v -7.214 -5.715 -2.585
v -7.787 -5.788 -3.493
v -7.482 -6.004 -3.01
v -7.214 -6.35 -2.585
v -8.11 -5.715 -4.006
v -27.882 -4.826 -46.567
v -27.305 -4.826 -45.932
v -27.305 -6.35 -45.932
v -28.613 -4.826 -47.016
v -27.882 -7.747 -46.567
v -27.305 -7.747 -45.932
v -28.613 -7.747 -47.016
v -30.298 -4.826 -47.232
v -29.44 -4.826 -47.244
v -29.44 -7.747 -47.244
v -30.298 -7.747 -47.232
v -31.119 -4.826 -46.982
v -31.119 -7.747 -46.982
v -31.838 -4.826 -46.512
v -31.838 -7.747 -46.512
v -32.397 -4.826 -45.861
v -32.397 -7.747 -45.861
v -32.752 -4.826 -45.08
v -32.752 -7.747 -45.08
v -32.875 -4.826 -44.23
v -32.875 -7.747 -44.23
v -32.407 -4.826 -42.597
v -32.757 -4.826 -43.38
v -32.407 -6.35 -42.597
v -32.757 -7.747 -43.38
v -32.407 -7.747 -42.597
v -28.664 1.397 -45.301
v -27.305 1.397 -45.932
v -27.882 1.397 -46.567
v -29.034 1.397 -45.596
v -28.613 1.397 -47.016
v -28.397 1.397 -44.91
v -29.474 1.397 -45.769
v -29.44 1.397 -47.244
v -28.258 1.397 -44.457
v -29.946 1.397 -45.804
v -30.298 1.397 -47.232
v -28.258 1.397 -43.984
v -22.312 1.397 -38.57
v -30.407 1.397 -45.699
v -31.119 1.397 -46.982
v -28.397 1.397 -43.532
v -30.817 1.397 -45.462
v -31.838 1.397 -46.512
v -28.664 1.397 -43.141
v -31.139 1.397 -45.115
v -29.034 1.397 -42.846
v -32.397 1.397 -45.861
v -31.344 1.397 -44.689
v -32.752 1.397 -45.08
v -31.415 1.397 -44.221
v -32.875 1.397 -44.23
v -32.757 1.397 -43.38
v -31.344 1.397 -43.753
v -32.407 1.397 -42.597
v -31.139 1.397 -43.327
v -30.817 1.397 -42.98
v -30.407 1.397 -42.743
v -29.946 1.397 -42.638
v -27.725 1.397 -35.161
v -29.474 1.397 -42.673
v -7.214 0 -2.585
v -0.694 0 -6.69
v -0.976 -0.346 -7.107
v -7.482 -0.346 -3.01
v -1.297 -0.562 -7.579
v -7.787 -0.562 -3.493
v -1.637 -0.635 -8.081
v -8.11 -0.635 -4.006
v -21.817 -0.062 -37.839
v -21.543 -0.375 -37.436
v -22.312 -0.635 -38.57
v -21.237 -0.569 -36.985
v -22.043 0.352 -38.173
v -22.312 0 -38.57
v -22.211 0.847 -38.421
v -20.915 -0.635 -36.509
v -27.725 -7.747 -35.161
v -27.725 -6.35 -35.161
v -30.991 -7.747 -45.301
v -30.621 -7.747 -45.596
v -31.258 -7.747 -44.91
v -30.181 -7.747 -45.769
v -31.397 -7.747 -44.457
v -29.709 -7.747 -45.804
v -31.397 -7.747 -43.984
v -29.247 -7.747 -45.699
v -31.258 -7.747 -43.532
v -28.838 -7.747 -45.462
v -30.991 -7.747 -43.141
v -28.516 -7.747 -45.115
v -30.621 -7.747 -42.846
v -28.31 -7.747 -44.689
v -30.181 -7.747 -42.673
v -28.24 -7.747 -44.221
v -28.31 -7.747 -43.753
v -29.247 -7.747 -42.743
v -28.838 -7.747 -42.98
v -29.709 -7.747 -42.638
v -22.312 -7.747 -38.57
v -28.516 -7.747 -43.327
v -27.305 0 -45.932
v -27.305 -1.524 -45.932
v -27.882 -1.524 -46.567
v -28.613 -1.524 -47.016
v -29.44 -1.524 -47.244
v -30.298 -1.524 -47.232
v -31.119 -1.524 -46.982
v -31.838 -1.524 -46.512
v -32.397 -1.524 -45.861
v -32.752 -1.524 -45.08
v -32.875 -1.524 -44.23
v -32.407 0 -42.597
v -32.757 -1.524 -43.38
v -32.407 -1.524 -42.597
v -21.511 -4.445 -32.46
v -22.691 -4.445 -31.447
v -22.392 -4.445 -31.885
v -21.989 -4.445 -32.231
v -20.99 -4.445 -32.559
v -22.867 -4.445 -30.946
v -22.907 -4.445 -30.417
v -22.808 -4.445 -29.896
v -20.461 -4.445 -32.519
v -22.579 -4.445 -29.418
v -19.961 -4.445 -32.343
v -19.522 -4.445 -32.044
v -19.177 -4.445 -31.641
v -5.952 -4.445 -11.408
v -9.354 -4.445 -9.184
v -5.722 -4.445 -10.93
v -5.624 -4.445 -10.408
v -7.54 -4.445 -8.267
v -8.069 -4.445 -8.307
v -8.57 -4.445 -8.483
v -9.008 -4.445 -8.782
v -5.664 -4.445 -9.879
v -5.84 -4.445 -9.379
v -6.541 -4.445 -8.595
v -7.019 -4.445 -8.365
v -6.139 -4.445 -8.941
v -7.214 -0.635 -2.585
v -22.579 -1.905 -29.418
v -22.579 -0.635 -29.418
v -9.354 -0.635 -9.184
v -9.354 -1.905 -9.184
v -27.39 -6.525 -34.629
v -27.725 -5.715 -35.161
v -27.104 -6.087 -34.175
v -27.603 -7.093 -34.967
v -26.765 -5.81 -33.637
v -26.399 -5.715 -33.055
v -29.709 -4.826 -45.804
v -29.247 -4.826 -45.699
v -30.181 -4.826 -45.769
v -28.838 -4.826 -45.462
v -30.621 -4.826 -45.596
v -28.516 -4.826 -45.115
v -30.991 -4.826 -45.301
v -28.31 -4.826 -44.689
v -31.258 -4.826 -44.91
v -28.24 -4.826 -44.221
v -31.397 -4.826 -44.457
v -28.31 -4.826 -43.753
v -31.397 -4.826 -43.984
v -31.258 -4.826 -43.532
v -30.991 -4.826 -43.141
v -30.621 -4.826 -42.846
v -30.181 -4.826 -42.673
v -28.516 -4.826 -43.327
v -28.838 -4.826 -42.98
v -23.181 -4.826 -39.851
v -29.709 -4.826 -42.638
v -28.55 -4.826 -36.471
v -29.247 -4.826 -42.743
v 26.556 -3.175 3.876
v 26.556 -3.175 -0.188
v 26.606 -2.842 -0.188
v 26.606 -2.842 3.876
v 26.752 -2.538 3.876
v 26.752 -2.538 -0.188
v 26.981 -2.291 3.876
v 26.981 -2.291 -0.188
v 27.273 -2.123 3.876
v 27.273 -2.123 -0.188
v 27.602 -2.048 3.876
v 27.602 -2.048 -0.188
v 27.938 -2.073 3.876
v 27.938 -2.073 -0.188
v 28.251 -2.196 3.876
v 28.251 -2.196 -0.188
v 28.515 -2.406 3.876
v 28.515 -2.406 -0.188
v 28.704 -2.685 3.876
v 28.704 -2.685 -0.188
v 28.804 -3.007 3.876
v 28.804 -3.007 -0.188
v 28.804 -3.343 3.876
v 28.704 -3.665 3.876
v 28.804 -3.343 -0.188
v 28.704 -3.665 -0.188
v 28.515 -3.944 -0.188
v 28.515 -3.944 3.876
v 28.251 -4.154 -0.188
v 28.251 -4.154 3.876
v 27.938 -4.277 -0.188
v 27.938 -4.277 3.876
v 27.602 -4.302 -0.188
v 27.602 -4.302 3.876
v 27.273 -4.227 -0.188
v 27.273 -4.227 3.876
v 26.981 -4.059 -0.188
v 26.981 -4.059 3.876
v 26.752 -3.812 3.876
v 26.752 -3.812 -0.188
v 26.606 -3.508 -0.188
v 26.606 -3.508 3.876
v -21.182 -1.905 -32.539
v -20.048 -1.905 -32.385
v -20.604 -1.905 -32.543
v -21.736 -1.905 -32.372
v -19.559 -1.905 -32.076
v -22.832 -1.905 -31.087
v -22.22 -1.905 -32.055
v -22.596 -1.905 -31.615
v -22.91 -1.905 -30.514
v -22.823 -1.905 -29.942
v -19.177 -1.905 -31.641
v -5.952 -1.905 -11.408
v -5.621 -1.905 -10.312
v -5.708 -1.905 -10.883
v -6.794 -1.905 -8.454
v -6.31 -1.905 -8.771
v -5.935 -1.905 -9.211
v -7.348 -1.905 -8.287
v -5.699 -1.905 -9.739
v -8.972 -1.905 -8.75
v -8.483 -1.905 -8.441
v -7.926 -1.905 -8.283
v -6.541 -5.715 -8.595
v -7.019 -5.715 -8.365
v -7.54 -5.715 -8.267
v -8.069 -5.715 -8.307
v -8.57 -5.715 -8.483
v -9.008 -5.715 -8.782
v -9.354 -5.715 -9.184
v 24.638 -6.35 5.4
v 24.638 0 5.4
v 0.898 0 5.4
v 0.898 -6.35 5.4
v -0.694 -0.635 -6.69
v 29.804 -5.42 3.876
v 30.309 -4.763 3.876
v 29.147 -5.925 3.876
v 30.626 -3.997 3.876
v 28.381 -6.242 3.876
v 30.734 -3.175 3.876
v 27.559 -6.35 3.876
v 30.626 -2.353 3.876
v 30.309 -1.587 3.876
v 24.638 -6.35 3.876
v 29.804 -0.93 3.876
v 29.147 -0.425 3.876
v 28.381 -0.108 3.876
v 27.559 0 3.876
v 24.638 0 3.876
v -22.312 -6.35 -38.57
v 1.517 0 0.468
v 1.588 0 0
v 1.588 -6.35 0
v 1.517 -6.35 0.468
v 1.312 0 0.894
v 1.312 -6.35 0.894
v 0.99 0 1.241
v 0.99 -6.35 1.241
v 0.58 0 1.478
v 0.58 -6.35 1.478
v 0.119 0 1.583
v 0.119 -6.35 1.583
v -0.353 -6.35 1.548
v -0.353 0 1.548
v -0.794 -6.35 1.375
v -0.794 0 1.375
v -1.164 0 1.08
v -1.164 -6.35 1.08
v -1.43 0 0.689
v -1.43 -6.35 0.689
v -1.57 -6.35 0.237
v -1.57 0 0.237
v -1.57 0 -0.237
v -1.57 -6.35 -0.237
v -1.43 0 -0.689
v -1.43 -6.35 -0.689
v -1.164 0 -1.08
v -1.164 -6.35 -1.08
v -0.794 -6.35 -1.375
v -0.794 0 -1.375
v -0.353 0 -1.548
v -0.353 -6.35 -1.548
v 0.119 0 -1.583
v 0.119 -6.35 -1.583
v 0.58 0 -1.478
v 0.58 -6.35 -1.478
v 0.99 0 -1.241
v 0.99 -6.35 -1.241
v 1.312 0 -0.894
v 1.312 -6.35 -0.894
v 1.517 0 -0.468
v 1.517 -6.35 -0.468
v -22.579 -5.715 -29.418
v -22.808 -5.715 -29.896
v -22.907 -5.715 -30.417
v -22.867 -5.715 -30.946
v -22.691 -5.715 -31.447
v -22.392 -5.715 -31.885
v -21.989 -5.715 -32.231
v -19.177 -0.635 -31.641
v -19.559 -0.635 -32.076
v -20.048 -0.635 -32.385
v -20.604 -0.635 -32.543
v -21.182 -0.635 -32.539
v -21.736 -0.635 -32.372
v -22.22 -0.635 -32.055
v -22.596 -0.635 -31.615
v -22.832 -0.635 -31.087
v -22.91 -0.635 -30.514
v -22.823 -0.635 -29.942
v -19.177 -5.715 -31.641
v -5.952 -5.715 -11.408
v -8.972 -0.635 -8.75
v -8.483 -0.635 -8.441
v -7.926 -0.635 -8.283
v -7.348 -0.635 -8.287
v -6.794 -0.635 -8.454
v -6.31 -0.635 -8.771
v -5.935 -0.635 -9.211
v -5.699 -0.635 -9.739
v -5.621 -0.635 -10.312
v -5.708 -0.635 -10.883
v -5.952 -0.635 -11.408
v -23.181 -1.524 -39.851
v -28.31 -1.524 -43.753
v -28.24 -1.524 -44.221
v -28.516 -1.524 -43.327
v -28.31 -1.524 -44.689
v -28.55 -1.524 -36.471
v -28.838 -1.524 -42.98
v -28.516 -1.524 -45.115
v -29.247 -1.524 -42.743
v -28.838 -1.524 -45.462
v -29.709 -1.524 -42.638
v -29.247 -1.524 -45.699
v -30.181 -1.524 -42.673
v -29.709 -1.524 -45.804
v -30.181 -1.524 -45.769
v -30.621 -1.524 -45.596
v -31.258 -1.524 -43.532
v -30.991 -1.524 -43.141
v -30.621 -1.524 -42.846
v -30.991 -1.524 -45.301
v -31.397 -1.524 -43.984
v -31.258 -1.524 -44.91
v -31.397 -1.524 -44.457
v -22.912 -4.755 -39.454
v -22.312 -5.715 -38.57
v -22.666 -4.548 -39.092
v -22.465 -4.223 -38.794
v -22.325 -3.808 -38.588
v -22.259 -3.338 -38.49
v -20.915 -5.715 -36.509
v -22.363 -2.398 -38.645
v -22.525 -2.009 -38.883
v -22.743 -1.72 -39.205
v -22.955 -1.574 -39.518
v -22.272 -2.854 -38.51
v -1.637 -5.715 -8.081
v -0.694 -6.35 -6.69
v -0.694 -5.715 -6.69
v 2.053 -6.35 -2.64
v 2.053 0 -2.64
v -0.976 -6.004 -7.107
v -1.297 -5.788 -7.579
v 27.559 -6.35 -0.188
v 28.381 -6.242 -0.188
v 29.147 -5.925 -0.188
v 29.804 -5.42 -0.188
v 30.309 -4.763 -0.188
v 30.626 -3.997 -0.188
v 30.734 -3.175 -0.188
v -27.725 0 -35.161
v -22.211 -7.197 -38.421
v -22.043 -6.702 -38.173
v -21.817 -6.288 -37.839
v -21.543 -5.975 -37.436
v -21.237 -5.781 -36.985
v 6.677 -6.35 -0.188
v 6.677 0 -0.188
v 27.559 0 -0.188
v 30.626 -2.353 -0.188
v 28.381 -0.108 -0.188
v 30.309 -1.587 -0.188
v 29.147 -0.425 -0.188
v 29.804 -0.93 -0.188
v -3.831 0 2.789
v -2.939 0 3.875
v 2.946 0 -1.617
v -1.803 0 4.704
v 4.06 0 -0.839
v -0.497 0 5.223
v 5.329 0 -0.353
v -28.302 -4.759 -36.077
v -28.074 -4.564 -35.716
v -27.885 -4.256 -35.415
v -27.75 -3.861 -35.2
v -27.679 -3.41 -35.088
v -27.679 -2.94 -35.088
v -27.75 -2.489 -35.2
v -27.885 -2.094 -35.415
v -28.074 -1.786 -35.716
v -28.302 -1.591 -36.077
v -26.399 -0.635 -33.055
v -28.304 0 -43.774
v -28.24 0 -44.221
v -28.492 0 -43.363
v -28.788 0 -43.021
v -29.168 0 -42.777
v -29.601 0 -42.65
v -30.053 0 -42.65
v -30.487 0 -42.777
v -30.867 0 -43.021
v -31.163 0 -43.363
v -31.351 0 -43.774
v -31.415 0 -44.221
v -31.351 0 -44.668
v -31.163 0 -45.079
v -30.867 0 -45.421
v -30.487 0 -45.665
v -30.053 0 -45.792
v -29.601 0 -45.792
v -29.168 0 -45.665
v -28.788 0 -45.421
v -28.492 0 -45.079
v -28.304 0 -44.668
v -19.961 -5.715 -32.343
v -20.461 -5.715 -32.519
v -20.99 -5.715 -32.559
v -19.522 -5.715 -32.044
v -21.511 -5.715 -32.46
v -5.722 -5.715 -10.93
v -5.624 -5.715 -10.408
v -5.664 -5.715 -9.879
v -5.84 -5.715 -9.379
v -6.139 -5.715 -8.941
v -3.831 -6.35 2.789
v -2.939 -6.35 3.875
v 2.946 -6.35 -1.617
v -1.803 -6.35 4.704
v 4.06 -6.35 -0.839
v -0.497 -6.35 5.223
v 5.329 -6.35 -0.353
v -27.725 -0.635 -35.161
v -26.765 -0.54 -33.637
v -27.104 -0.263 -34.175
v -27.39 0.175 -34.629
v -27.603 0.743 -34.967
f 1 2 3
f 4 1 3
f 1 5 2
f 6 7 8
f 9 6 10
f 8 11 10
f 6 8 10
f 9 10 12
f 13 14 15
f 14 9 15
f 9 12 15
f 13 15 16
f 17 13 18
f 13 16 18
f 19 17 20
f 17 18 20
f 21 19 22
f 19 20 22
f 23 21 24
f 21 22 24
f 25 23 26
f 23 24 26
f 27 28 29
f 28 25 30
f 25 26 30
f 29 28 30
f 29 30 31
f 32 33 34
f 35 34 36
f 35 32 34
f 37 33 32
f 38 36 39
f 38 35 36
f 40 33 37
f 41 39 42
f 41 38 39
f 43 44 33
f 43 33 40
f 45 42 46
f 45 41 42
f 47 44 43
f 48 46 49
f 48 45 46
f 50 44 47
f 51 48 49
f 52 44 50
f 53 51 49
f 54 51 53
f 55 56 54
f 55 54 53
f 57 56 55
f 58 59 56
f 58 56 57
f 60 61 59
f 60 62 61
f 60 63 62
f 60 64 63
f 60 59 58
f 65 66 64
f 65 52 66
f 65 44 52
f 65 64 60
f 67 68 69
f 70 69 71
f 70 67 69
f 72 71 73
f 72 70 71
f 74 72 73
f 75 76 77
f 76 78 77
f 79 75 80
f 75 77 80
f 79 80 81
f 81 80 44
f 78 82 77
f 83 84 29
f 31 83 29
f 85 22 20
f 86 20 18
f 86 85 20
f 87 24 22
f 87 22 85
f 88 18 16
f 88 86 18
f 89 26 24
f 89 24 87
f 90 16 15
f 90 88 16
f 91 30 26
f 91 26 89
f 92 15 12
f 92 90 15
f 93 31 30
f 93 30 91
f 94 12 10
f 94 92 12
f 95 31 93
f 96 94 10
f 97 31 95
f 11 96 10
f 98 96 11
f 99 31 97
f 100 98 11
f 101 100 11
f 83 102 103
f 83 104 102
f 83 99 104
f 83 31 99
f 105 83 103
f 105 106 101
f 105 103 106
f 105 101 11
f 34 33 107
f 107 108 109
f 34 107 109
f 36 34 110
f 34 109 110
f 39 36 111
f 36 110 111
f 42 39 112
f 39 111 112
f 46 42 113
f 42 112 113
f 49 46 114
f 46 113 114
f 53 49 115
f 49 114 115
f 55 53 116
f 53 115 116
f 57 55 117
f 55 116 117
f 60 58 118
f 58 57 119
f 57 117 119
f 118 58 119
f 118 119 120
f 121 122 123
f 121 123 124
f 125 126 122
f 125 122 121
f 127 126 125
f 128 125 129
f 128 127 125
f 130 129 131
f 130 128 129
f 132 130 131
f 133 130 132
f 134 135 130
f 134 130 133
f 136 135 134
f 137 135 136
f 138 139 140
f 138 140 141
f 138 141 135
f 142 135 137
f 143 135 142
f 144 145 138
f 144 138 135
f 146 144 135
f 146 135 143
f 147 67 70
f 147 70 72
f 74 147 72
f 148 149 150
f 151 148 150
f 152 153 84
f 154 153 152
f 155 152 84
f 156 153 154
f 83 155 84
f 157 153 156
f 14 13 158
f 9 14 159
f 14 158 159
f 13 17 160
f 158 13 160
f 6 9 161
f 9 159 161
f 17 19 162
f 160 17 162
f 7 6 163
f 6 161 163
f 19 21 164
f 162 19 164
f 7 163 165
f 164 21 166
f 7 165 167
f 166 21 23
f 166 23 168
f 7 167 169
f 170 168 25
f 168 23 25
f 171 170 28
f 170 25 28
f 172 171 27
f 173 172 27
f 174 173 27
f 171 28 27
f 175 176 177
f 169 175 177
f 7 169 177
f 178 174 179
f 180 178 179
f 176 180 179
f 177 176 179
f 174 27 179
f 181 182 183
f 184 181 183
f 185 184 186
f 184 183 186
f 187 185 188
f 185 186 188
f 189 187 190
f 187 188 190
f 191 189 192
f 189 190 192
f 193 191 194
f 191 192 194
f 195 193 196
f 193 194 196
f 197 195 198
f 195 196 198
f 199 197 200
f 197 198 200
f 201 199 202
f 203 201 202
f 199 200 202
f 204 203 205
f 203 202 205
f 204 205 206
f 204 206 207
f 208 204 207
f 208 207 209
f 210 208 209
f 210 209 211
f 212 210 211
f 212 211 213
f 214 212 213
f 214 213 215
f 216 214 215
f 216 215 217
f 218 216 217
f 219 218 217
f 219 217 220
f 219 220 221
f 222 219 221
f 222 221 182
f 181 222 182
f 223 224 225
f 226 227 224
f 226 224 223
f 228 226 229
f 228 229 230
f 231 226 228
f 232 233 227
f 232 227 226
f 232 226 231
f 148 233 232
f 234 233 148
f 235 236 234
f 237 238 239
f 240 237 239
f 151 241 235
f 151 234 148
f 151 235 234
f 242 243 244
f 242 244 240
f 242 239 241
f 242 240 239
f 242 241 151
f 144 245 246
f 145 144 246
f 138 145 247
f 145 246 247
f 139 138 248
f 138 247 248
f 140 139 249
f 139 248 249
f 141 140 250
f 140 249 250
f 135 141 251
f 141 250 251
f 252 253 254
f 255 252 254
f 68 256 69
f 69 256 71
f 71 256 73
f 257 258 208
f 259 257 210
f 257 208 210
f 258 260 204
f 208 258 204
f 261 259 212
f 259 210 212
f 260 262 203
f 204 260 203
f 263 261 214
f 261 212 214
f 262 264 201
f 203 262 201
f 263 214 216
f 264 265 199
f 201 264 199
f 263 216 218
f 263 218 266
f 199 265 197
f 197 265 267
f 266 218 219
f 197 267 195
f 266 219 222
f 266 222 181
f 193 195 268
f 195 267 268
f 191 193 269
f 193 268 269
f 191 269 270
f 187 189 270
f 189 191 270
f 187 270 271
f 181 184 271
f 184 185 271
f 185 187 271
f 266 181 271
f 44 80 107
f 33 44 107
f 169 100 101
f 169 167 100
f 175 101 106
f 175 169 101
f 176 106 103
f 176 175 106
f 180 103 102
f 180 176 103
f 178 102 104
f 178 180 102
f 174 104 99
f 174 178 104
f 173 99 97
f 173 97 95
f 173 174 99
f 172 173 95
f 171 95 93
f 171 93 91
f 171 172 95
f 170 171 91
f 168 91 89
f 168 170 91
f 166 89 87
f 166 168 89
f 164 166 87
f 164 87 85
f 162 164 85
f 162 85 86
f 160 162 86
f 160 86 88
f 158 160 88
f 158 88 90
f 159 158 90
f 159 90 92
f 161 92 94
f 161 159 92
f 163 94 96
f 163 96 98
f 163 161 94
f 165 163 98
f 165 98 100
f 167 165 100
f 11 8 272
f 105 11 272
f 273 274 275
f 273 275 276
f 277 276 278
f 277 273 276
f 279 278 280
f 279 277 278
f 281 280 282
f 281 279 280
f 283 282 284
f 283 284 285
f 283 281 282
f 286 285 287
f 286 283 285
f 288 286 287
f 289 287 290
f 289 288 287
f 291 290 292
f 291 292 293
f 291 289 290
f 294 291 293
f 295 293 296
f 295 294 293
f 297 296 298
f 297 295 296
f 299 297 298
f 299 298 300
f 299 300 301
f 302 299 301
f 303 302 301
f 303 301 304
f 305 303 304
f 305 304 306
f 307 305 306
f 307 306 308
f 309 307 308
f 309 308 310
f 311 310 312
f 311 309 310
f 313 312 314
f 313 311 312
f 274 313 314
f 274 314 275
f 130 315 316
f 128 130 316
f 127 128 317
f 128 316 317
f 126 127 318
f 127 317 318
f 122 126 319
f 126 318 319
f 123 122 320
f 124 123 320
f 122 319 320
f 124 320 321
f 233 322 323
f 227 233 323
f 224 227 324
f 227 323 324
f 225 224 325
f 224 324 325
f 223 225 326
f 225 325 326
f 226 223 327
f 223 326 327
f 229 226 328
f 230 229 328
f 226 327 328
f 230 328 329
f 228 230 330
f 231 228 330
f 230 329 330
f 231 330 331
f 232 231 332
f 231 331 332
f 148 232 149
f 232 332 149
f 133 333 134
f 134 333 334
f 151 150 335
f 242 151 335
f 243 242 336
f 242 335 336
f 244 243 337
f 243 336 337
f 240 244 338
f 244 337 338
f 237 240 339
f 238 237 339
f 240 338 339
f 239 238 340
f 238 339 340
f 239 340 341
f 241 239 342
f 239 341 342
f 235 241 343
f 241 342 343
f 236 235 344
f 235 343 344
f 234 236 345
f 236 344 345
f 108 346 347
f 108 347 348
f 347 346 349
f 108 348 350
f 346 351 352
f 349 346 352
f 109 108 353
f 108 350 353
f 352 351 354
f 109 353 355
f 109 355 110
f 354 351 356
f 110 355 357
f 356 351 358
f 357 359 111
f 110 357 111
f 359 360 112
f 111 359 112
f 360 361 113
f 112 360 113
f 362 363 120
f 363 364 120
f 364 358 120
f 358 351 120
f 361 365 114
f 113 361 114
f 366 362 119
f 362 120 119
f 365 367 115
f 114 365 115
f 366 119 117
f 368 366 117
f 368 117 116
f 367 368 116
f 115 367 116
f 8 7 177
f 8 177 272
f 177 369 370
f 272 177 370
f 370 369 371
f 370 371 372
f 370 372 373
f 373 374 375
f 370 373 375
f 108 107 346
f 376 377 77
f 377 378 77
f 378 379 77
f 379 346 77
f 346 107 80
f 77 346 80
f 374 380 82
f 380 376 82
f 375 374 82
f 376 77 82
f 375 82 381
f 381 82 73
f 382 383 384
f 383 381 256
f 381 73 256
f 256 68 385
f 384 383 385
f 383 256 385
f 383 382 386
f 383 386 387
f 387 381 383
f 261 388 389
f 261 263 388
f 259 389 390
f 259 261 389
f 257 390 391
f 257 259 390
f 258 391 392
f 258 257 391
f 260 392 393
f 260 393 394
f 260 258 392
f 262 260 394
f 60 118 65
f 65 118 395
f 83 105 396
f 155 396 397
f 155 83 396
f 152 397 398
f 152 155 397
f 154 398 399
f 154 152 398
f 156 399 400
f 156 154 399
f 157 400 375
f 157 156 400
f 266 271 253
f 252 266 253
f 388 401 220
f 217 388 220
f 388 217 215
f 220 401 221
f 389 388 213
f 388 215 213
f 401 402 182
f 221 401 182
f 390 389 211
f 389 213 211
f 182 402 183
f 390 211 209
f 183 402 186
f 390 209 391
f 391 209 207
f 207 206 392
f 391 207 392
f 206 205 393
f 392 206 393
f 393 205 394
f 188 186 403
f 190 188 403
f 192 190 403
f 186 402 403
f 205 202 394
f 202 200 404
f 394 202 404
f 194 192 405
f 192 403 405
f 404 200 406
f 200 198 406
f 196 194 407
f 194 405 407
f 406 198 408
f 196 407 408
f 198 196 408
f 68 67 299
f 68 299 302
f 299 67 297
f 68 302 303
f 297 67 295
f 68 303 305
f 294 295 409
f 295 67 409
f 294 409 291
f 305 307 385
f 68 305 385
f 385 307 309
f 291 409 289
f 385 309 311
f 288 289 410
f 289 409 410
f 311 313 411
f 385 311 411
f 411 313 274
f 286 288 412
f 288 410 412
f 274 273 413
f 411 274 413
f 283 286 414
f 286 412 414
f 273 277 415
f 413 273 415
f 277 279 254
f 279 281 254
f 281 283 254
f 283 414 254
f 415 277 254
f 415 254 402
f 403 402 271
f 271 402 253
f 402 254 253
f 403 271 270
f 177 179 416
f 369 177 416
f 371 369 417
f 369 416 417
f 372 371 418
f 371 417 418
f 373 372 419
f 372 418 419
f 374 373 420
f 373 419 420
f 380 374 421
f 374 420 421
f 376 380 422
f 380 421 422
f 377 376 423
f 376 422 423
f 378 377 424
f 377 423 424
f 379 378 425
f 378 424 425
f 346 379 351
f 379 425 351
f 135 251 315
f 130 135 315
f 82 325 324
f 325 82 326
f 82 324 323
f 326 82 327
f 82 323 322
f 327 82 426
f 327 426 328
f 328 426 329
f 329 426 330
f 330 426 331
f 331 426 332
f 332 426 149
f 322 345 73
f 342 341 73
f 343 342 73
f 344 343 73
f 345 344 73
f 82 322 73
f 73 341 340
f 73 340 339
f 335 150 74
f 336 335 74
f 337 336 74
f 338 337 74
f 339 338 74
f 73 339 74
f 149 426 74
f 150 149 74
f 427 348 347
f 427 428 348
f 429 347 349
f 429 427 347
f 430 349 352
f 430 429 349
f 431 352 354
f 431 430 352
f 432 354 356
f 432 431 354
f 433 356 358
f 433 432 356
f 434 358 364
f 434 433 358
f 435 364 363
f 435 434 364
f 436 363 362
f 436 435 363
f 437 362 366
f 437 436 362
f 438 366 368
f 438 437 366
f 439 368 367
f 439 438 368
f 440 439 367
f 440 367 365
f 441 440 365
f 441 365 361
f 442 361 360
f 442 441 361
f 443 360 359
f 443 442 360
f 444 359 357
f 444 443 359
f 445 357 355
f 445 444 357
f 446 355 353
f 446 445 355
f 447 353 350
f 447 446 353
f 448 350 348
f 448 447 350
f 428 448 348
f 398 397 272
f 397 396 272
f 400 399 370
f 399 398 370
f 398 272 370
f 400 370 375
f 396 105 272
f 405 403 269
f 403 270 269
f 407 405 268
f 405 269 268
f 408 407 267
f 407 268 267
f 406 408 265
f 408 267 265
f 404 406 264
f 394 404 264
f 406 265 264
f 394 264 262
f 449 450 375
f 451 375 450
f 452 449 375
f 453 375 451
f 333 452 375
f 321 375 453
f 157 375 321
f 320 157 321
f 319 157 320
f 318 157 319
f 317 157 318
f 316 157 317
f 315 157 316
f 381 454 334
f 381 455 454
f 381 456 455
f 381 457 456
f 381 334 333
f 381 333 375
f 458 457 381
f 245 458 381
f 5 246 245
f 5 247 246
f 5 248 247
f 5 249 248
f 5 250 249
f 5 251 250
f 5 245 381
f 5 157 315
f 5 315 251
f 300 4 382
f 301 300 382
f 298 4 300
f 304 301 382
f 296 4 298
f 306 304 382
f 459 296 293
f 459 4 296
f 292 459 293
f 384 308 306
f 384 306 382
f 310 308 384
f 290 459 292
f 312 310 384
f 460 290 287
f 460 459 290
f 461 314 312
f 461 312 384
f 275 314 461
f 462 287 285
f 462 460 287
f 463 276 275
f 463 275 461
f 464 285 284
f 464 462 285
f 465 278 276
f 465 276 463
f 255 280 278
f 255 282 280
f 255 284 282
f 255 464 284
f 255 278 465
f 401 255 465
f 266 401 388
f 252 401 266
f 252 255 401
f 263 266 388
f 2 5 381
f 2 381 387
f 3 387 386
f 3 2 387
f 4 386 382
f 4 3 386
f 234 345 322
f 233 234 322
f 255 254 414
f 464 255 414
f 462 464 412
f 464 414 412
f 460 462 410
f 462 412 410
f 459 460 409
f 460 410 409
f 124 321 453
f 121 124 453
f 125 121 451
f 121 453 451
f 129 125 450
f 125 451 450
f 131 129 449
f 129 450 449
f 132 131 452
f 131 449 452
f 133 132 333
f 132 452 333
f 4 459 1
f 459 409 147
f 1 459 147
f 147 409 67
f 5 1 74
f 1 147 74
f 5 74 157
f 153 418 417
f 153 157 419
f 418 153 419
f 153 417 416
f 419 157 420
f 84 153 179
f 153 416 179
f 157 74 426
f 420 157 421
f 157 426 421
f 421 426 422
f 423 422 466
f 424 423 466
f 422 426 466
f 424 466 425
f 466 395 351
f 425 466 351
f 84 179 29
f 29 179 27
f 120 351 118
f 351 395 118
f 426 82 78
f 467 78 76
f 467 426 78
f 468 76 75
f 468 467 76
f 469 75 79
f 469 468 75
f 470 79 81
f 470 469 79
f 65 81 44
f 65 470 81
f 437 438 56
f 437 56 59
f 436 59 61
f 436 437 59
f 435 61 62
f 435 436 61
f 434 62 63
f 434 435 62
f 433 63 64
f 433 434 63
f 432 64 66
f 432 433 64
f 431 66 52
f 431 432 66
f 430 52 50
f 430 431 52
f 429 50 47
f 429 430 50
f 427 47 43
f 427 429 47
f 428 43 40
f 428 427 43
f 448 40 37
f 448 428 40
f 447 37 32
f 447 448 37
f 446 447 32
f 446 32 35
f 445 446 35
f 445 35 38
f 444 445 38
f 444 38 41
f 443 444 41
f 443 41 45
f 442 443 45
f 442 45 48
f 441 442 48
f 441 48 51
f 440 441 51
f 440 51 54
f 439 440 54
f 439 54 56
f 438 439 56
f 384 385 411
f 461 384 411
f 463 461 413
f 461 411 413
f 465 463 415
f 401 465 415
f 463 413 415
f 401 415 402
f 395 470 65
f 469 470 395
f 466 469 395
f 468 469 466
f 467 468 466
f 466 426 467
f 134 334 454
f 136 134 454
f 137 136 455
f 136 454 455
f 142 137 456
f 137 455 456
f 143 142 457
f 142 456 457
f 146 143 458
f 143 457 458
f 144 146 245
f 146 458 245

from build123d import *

# Parameters (mm, degrees)
F0_R          = 1.5875
F1_DEPTH      = 6.35
F3_D          = 2.2606
F4_R          = 3.17499
F5_R          = 1.5875
F6_DEPTH      = 1.397
F7_R          = 1.5875
F8_DEPTH      = 1.397
F10_DEPTH     = 55.922402023
F11_W         = 0.635
F11_H         = 38.4961159321
F12_DEPTH     = 55.922402023
F13_T4_DEPTH  = 12.6181992369
F13_T9_DEPTH  = 12.6181992369
F13_T14_DEPTH = 11.9054737587
F13_T19_DEPTH = 11.9054737587
F15_DEPTH     = 1.27
F17_DEPTH     = 1.27


# Not quite as in the source:
# - a fillet or chamfer that OpenCascade refuses, or shapes differently, is made with other operations: its cross-section is extruded or revolved along the edge and cut away or added
# - a fillet or chamfer is up to 0.001 mm smaller than in the source, because OpenCascade refuses the exact size


with BuildPart() as f1:
    # F0 (on Front) → F1 (new body)
    with BuildSketch(Plane.XZ):
        with BuildLine():
            Line((6.6774413169, -0.1881909028), (30.734, -0.1881909028))
            Line((30.734, -0.1881909028), (30.734, 3.8758090972))
            Line((30.734, 3.8758090972), (24.638, 3.8758090972))
            Line((24.638, 3.8758090972), (24.638, 5.3998090972))
            Line((24.638, 5.3998090972), (0.8976435847, 5.3998090972))
            ThreePointArc((0.8976435847, 5.3998090972), (-1.8031521678, 4.7037868469), (-3.8311440773, 2.7891084184))
            Line((-3.8311440773, 2.7891084184), (-32.4066881959, -42.5968826722))
            ThreePointArc((-32.4066881959, -42.5968826722), (-31.4949255527, -46.7722351265), (-27.3046829217, -45.931553303))
            Line((-27.3046829217, -45.931553303), (2.052552643, -2.6399274008))
            ThreePointArc((2.052552643, -2.6399274008), (4.0601618562, -0.8390265117), (6.6774413169, -0.1881909028))
        make_face()
        with Locations((-29.8273494711, -44.2208641201)):
            Circle(F0_R, mode=Mode.SUBTRACT)
        Circle(F0_R, mode=Mode.SUBTRACT)
    extrude(amount=F1_DEPTH)

    # F3 (through all)
    with Locations(Plane.XY.offset(3.8758090972)):
        with Locations((27.686, -3.175)):
            Hole(F3_D / 2)

    # F4 (radius 3.175 in the source; OpenCascade refuses exactly that, so slightly less here)
    f4_edges = [f1.edges().sort_by_distance(p)[0] for p in [
        (30.734, -6.35, 1.843809),
        (30.734, 0, 1.843809),
    ]]
    fillet(f4_edges, radius=F4_R)

    # F5 (on face) → F6 (join)
    with BuildSketch(Plane.XZ.offset(6.35)):
        with BuildLine():
            Line((-27.3046829217, -45.931553303), (-22.3122897877, -38.5695244281))
            Line((-22.3122897877, -38.5695244281), (-27.7252582931, -35.1614569468))
            Line((-27.7252582931, -35.1614569468), (-32.4066881959, -42.5968826722))
            ThreePointArc((-32.4066881959, -42.5968826722), (-31.4949255527, -46.7722351265), (-27.3046829217, -45.931553303))
        make_face()
        with Locations((-29.8273494711, -44.2208641201)):
            Circle(F5_R, mode=Mode.SUBTRACT)
    extrude(amount=F6_DEPTH)

    # F7 (on face) → F8 (join)
    with BuildSketch(Plane(origin=(0, 0, 0), x_dir=(-1, 0, 0), z_dir=(0, 1, 0))):
        with BuildLine():
            ThreePointArc((27.3046829217, -45.931553303), (31.4949255527, -46.7722351265), (32.4066881959, -42.5968826722))
            Line((32.4066881959, -42.5968826722), (27.7252582931, -35.1614569468))
            Line((27.7252582931, -35.1614569468), (22.3122897877, -38.5695244281))
            Line((22.3122897877, -38.5695244281), (27.3046829217, -45.931553303))
        make_face()
        with Locations((29.8273494711, -44.2208641201)):
            Circle(F7_R, mode=Mode.SUBTRACT)
    extrude(amount=F8_DEPTH)

    # F9 (on face) → F10 (cut, through all)
    with BuildSketch(Plane(origin=(-4.0011143857, 0, 2.519147823), x_dir=(0, -1, 0), z_dir=(-0.8462397391, 0, 0.5328023123))):
        with BuildLine():
            Line((1.524, -56.3615332831), (4.826, -56.3615332831))
            Line((4.826, -56.3615332831), (4.826, -46.0745332831))
            ThreePointArc((4.826, -46.0745332831), (3.175, -44.4235332831), (1.524, -46.0745332831))
            Line((1.524, -46.0745332831), (1.524, -56.3615332831))
        make_face()
    extrude(amount=-F10_DEPTH, mode=Mode.SUBTRACT)

    # F11 (on face) → F12 (cut, through all)
    with BuildSketch(Plane(origin=(-4.0011143857, 0, 2.519147823), x_dir=(0, -1, 0), z_dir=(-0.8462397391, 0, 0.5328023123))):
        with Locations((0.3175, -25.2790459142)):
            Rectangle(F11_W, F11_H)
        with Locations((6.0325, -25.2790459142)):
            Rectangle(F11_W, F11_H)
    extrude(amount=-F12_DEPTH, mode=Mode.SUBTRACT)

    # F13: fillet of radius 2.54 on 4 edges, made by hand


with BuildPart() as f13_tool2:
    # F13_s3 → F13_t4 (new body)
    with BuildSketch(Plane(origin=(-4.0011143857, 0, 2.519147823), x_dir=(0, 1, 0), z_dir=(0.8462397391, 0, -0.5328023123))):
        with BuildLine():
            ThreePointArc((-7.747, -44.5271038802), (-6.2875244601, -43.6448593529), (-5.715, -42.0384223016))
            Line((-5.715, -42.0384223016), (-5.715, -44.5271038802))
            Line((-5.715, -44.5271038802), (-7.747, -44.5271038802))
        make_face()
    extrude(amount=F13_T4_DEPTH)

    split(bisect_by=Plane(origin=(2.6322854892, 0, -1.7850247841), x_dir=(0, 1, 0), z_dir=(-0.8276465057, 0, 0.5612497319)), keep=Keep.TOP)


with BuildPart() as f1_1:
    add(f1.part)

    # F13_t1: union F13_tool2
    add(f13_tool2.part)


with BuildPart() as f13_tool7:
    # F13_s8 → F13_t9 (new body)
    with BuildSketch(Plane(origin=(-4.0011143857, 0, 2.519147823), x_dir=(0, 1, 0), z_dir=(0.8462397391, 0, -0.5328023123))):
        with BuildLine():
            ThreePointArc((-0.635, -42.0384223016), (-0.0624755399, -43.6448593529), (1.397, -44.5271038802))
            Line((1.397, -44.5271038802), (-0.635, -44.5271038802))
            Line((-0.635, -44.5271038802), (-0.635, -42.0384223016))
        make_face()
    extrude(amount=F13_T9_DEPTH)

    split(bisect_by=Plane(origin=(2.6322854892, 0, -1.7850247841), x_dir=(0, 1, 0), z_dir=(-0.8276465057, 0, 0.5612497319)), keep=Keep.TOP)


with BuildPart() as f1_2:
    add(f1_1.part)

    # F13_t6: union F13_tool7
    add(f13_tool7.part)


with BuildPart() as f13_tool12:
    # F13_s13 → F13_t14 (new body)
    with BuildSketch(Plane(origin=(-4.0011143857, 0, 2.519147823), x_dir=(0, 1, 0), z_dir=(0.8462397391, 0, -0.5328023123))):
        with BuildLine():
            ThreePointArc((0, -6.0309879482), (-0.4709524406, -6.8130144186), (-0.635, -7.7110400307))
            Line((-0.635, -7.7110400307), (-0.635, -6.0309879482))
            Line((-0.635, -6.0309879482), (0, -6.0309879482))
        make_face()
    extrude(amount=F13_T14_DEPTH)

    split(bisect_by=Plane(origin=(2.6322854892, 0, -1.7850247841), x_dir=(0, 1, 0), z_dir=(-0.8276465057, 0, 0.5612497319)), keep=Keep.TOP)


with BuildPart() as f1_3:
    add(f1_2.part)

    # F13_t11: union F13_tool12
    add(f13_tool12.part)


with BuildPart() as f13_tool17:
    # F13_s18 → F13_t19 (new body)
    with BuildSketch(Plane(origin=(-4.0011143857, 0, 2.519147823), x_dir=(0, 1, 0), z_dir=(0.8462397391, 0, -0.5328023123))):
        with BuildLine():
            ThreePointArc((-5.715, -7.7110400307), (-5.8790475594, -6.8130144186), (-6.35, -6.0309879482))
            Line((-6.35, -6.0309879482), (-5.715, -6.0309879482))
            Line((-5.715, -6.0309879482), (-5.715, -7.7110400307))
        make_face()
    extrude(amount=F13_T19_DEPTH)

    split(bisect_by=Plane(origin=(2.6322854892, 0, -1.7850247841), x_dir=(0, 1, 0), z_dir=(-0.8276465057, 0, 0.5612497319)), keep=Keep.TOP)


with BuildPart() as f1_4:
    add(f1_3.part)

    # F13_t16: union F13_tool17
    add(f13_tool17.part)

    # F14 (on face) → F15 (cut)
    with BuildSketch(Plane.XZ.offset(5.715)):
        with BuildLine():
            ThreePointArc((-22.5785911234, -29.4180135738), (-22.8665153513, -30.9463544712), (-21.9894083128, -32.2306478578))
            ThreePointArc((-21.9894083128, -32.2306478578), (-20.4610674153, -32.5185720857), (-19.1767740287, -31.6414650472))
            Line((-19.1767740287, -31.6414650472), (-5.9518651728, -11.4077331396))
            ThreePointArc((-5.9518651728, -11.4077331396), (-5.6639409449, -9.8793922421), (-6.5410479835, -8.5950988555))
            ThreePointArc((-6.5410479835, -8.5950988555), (-8.0693888809, -8.3071746276), (-9.3536822675, -9.1842816662))
            Line((-9.3536822675, -9.1842816662), (-22.5785911234, -29.4180135738))
        make_face()
    extrude(amount=-F15_DEPTH, mode=Mode.SUBTRACT)

    # F16 (on face) → F17 (cut)
    with BuildSketch(Plane(origin=(0, -0.635, 0), x_dir=(-1, 0, 0), z_dir=(0, 1, 0))):
        with BuildLine():
            ThreePointArc((19.1767740287, -31.6414650472), (21.9894083128, -32.2306478578), (22.5785911234, -29.4180135738))
            Line((22.5785911234, -29.4180135738), (9.3536822675, -9.1842816662))
            ThreePointArc((9.3536822675, -9.1842816662), (6.5410479835, -8.5950988555), (5.9518651728, -11.4077331396))
            Line((5.9518651728, -11.4077331396), (19.1767740287, -31.6414650472))
        make_face()
    extrude(amount=-F17_DEPTH, mode=Mode.SUBTRACT)


solid = f1_4.part
